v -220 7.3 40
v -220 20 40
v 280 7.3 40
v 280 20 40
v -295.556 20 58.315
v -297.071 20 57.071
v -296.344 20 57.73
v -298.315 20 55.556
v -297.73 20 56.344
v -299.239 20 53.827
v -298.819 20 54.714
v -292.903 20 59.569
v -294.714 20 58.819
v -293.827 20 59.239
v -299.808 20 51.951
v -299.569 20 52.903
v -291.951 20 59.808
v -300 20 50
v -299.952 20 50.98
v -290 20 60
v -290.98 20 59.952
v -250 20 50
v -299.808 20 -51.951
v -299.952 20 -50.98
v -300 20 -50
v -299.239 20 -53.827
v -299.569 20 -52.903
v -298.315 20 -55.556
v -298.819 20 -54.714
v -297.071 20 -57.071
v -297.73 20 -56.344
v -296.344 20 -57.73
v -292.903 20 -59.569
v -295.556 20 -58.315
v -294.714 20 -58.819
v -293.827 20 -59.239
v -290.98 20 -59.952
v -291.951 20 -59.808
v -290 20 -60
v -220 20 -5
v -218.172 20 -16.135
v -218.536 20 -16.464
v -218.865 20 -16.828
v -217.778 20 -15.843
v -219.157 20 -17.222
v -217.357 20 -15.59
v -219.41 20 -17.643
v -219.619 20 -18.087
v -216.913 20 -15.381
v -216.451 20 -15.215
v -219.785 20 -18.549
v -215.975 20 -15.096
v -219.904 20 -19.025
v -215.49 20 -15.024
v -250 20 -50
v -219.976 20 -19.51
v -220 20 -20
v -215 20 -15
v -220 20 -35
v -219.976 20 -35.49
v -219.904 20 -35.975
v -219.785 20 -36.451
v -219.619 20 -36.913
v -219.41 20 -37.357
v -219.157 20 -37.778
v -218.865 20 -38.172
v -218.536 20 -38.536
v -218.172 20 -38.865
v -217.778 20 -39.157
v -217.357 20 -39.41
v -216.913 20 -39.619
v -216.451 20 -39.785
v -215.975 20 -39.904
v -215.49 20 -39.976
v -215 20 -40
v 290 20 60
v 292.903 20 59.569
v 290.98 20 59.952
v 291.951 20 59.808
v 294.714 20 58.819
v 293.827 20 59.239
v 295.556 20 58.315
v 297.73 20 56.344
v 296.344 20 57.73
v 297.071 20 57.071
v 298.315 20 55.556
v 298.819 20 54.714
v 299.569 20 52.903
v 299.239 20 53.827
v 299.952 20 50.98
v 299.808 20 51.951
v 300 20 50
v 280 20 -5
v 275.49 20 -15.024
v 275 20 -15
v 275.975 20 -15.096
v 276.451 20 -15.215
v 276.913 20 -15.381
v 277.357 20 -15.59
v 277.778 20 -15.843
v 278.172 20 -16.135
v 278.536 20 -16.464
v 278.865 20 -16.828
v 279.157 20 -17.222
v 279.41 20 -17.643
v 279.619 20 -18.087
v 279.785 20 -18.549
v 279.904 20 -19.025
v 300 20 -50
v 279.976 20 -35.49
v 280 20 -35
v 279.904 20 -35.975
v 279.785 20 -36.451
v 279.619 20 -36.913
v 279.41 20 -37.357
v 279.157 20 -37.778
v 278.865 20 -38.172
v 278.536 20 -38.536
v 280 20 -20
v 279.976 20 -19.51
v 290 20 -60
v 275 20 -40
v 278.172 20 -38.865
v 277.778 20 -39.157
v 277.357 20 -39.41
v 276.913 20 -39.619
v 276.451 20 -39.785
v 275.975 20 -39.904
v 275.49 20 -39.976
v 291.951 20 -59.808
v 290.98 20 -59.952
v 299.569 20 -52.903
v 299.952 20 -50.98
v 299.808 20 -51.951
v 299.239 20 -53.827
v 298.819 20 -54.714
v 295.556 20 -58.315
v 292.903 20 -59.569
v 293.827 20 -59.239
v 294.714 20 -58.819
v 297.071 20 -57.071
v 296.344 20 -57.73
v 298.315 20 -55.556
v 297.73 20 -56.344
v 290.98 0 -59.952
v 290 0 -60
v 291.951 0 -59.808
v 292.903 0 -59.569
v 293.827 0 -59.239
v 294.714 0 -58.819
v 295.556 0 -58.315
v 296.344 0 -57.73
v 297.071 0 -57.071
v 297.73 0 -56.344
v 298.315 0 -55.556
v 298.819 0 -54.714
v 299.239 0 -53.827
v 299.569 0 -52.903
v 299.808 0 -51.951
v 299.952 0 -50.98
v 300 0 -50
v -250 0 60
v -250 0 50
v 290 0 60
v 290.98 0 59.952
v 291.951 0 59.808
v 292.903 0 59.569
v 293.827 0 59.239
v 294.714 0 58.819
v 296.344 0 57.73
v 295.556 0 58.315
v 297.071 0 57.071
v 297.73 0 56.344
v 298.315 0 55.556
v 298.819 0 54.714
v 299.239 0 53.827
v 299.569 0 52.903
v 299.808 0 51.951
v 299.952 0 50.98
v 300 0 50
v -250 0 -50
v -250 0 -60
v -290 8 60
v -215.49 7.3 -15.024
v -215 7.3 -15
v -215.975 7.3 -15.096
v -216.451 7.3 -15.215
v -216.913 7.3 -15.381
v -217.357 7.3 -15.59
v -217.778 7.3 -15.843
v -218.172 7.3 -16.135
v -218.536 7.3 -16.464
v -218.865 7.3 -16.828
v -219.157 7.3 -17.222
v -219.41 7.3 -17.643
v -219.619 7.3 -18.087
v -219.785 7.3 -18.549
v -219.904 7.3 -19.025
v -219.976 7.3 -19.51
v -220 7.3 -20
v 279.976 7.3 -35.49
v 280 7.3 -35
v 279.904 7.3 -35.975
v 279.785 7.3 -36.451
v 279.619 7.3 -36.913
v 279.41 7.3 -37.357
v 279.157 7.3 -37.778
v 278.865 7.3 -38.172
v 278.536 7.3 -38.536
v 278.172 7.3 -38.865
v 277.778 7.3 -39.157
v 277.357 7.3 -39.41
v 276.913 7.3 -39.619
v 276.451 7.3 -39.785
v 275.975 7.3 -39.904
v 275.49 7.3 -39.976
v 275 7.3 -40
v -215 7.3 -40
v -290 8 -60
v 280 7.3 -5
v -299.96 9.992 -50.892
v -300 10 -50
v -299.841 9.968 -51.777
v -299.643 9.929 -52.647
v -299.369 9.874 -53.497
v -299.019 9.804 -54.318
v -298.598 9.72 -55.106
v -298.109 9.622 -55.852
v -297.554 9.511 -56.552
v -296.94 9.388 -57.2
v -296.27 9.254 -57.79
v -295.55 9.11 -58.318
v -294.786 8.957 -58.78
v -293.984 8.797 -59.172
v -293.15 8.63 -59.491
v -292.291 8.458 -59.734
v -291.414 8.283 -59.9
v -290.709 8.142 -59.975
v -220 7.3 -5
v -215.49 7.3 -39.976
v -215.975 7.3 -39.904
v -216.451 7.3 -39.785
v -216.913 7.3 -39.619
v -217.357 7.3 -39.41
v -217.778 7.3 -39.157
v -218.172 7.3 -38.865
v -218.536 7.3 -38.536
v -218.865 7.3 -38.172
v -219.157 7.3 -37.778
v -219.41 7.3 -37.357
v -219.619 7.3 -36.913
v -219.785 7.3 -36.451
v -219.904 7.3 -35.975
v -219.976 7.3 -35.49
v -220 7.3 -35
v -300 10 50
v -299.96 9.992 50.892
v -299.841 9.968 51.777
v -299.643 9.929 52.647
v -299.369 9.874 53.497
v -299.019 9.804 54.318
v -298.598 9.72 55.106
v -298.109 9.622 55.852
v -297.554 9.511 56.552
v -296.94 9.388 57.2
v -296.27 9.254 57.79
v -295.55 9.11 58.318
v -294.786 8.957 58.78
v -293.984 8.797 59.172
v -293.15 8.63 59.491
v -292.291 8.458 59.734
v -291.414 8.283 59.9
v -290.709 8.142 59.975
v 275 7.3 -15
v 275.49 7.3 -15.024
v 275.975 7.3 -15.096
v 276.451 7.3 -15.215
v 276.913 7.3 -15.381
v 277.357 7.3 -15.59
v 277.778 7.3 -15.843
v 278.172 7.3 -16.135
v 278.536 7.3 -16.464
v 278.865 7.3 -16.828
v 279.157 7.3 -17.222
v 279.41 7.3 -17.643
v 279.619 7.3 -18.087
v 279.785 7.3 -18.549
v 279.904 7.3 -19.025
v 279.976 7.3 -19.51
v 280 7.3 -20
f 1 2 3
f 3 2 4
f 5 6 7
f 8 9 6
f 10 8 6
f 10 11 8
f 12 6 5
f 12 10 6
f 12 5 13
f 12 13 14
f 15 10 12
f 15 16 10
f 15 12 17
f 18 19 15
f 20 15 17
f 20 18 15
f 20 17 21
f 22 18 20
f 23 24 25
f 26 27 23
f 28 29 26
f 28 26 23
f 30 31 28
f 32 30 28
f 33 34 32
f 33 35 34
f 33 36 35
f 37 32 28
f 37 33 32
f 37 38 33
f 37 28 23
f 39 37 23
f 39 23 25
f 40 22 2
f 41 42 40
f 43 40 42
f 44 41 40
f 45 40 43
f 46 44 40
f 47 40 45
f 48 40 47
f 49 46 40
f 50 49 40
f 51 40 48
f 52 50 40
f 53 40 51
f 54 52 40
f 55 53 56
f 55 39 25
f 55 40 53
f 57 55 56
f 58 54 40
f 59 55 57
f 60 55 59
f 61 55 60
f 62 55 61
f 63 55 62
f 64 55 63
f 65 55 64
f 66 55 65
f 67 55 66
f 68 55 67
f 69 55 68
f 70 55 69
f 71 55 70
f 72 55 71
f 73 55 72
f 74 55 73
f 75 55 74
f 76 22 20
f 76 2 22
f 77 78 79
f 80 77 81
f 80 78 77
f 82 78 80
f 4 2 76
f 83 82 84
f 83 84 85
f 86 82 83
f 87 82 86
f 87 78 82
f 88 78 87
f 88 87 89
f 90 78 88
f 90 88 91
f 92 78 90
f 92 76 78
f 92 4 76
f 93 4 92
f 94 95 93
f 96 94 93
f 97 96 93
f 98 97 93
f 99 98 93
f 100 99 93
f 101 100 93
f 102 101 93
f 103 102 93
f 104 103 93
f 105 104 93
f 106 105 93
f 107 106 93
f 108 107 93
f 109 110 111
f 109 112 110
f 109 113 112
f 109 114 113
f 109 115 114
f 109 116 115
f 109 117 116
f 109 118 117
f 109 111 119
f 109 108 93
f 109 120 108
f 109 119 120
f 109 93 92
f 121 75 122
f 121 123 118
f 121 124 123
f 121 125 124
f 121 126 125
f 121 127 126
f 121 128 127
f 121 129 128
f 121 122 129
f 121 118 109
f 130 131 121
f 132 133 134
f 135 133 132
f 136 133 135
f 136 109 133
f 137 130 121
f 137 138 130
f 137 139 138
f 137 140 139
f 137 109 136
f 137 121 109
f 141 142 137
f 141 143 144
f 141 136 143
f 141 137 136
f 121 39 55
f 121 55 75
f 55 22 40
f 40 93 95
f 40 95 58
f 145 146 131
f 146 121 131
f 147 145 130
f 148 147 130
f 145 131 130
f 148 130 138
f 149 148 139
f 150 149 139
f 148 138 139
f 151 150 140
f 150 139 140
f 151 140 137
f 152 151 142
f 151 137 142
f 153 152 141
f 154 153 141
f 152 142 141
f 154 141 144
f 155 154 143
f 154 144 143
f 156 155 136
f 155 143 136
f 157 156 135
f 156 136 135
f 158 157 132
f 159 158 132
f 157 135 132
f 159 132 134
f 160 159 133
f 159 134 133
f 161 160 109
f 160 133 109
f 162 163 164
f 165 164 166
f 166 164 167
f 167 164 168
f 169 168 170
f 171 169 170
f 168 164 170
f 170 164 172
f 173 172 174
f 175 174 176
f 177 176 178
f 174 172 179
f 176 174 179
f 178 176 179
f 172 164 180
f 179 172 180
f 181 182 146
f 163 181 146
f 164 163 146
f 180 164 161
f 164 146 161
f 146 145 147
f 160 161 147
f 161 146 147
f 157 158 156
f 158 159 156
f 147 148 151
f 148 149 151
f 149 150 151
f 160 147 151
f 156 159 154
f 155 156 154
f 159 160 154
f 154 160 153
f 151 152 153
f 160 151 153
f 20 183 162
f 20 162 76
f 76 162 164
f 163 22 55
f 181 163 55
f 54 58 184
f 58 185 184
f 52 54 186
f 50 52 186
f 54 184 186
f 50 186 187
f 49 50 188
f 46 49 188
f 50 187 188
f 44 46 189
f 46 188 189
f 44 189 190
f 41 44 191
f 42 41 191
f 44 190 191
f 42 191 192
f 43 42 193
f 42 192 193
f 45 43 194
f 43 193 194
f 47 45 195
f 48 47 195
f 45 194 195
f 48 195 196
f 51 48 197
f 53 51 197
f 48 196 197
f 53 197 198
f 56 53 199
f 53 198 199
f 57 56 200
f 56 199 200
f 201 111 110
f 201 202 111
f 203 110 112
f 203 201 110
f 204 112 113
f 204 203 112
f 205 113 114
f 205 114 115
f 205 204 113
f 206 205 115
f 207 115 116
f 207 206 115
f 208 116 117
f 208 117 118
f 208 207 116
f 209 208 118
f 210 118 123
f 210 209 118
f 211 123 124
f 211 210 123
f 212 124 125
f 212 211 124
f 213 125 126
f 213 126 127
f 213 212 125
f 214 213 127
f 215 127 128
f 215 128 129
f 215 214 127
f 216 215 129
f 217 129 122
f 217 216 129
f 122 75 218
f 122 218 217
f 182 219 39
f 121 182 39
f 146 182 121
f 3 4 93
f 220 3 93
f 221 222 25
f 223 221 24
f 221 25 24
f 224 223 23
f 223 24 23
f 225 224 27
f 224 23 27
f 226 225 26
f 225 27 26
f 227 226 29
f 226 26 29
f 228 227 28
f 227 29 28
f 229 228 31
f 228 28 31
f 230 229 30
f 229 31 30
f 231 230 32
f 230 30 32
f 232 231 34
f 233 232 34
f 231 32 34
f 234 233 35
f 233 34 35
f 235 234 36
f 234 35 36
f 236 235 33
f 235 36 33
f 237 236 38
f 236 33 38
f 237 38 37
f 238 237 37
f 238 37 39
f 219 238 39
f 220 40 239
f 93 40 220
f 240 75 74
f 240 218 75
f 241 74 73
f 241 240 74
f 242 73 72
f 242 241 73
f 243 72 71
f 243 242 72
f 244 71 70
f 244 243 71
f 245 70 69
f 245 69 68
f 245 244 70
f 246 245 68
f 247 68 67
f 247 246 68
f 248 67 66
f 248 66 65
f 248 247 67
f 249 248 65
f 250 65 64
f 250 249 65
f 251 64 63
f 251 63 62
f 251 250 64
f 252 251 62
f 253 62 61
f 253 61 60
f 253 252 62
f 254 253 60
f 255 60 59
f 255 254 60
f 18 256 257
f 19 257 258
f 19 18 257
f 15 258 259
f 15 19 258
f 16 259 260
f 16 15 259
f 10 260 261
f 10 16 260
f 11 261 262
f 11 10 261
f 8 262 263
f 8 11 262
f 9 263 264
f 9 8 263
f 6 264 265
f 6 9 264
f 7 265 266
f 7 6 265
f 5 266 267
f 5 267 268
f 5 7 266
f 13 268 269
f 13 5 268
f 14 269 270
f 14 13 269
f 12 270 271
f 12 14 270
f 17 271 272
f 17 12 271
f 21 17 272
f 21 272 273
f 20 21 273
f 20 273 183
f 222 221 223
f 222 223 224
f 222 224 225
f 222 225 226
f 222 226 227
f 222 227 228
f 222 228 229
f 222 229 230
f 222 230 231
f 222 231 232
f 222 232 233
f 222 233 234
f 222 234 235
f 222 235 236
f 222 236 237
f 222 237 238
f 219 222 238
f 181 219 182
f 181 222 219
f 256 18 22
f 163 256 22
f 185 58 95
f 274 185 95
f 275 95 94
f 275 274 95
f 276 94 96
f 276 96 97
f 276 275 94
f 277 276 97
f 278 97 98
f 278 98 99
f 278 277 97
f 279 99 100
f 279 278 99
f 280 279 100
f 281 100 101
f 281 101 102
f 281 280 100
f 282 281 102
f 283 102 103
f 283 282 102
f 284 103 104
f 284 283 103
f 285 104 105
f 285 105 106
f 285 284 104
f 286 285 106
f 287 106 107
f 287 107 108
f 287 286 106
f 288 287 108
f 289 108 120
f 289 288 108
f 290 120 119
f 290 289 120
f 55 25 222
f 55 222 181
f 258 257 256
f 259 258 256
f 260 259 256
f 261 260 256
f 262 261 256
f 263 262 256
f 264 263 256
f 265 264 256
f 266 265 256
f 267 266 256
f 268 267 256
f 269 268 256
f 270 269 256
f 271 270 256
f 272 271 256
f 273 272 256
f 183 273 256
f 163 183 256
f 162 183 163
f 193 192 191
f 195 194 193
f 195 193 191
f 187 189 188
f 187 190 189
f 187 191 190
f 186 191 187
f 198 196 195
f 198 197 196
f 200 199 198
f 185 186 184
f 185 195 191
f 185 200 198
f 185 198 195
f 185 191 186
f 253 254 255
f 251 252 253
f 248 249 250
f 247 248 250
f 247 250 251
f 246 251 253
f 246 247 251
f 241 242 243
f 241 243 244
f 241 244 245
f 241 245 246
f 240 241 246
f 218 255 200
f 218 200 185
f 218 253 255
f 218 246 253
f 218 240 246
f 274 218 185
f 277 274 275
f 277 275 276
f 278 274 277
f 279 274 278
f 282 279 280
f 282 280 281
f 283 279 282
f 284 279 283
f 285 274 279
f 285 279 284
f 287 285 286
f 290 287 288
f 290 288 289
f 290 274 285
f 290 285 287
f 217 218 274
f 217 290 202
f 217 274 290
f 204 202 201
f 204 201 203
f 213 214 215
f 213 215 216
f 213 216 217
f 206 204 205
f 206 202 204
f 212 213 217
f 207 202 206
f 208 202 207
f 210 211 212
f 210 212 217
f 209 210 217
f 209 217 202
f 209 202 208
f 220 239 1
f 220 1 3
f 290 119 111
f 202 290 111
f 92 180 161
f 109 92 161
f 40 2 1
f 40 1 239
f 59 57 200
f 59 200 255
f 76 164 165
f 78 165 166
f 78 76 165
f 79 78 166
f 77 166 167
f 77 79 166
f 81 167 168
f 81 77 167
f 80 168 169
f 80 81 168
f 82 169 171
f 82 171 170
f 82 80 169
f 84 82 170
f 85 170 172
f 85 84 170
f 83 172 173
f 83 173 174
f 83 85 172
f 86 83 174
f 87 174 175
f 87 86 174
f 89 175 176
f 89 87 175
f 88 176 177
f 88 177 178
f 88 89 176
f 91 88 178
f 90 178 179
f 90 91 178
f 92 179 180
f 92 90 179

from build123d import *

# Parameters (mm, degrees)
SKETCH1_W           = 600
SKETCH1_H           = 120
BOSS_EXTRUDE1_DEPTH = 20
CUT_EXTRUDE1_REACH  = 325.728
SKETCH6_W           = 500
SKETCH6_H           = 25
SKETCH6_H_2         = 45
CUT_EXTRUDE2_DEPTH  = 12.7
FILLET1_R           = 10
FILLET2_R           = 5
CUT_EXTRUDE3_REACH  = 308.594
SKETCH7_W           = 50
SKETCH7_H           = 100


with BuildPart() as part:
    # Sketch1 → Boss-Extrude1 (new body)
    with BuildSketch(Plane(origin=(0, 0, 0), x_dir=(1, 0, 0), z_dir=(0, 1, 0))):
        Rectangle(SKETCH1_W, SKETCH1_H)
    extrude(amount=BOSS_EXTRUDE1_DEPTH)

    # Sketch4 → Cut-Extrude1 (cut, up to next)
    with BuildSketch(Plane.XY.offset(60), mode=Mode.PRIVATE) as cut_extrude1_sk1:
        Polygon((-300, 10), (-250, 0), (-300, 0), align=None)
    cut_extrude1_tool1 = extrude(cut_extrude1_sk1.sketch, amount=-CUT_EXTRUDE1_REACH, mode=Mode.PRIVATE) & part.part
    add(cut_extrude1_tool1.solids().sort_by_distance((-283.333333, 3.333333, 60))[0], mode=Mode.SUBTRACT)

    # Sketch6 → Cut-Extrude2 (cut)
    with BuildSketch(Plane(origin=(0, 20, 0), x_dir=(1, 0, 0), z_dir=(0, 1, 0))):
        with Locations((30, 27.5)):
            Rectangle(SKETCH6_W, SKETCH6_H)
        with Locations((30, -17.5)):
            Rectangle(SKETCH6_W, SKETCH6_H_2)
    extrude(amount=-CUT_EXTRUDE2_DEPTH, mode=Mode.SUBTRACT)

    # Fillet1
    fillet1_edges = [part.edges().sort_by_distance(p)[0] for p in [
        (-300, 15, -60),
        (300, 10, -60),
        (300, 10, 60),
        (-300, 15, 60),
    ]]
    fillet(fillet1_edges, radius=FILLET1_R)

    # Fillet2
    fillet2_edges = [part.edges().sort_by_distance(p)[0] for p in [
        (-220, 13.65, -15),
        (-220, 13.65, -40),
        (280, 13.65, -40),
        (280, 13.65, -15),
    ]]
    fillet(fillet2_edges, radius=FILLET2_R)

    # Sketch7 → Cut-Extrude3 (cut, up to next)
    with BuildSketch(Plane(origin=(0, 20, 0), x_dir=(1, 0, 0), z_dir=(0, 1, 0)), mode=Mode.PRIVATE) as cut_extrude3_sk1:
        with Locations((-275, 0)):
            Rectangle(SKETCH7_W, SKETCH7_H)
    cut_extrude3_tool1 = extrude(cut_extrude3_sk1.sketch, amount=-CUT_EXTRUDE3_REACH, mode=Mode.PRIVATE) & part.part
    add(cut_extrude3_tool1.solids().sort_by_distance((-275, 20, 0))[0], mode=Mode.SUBTRACT)


solid = part.part
